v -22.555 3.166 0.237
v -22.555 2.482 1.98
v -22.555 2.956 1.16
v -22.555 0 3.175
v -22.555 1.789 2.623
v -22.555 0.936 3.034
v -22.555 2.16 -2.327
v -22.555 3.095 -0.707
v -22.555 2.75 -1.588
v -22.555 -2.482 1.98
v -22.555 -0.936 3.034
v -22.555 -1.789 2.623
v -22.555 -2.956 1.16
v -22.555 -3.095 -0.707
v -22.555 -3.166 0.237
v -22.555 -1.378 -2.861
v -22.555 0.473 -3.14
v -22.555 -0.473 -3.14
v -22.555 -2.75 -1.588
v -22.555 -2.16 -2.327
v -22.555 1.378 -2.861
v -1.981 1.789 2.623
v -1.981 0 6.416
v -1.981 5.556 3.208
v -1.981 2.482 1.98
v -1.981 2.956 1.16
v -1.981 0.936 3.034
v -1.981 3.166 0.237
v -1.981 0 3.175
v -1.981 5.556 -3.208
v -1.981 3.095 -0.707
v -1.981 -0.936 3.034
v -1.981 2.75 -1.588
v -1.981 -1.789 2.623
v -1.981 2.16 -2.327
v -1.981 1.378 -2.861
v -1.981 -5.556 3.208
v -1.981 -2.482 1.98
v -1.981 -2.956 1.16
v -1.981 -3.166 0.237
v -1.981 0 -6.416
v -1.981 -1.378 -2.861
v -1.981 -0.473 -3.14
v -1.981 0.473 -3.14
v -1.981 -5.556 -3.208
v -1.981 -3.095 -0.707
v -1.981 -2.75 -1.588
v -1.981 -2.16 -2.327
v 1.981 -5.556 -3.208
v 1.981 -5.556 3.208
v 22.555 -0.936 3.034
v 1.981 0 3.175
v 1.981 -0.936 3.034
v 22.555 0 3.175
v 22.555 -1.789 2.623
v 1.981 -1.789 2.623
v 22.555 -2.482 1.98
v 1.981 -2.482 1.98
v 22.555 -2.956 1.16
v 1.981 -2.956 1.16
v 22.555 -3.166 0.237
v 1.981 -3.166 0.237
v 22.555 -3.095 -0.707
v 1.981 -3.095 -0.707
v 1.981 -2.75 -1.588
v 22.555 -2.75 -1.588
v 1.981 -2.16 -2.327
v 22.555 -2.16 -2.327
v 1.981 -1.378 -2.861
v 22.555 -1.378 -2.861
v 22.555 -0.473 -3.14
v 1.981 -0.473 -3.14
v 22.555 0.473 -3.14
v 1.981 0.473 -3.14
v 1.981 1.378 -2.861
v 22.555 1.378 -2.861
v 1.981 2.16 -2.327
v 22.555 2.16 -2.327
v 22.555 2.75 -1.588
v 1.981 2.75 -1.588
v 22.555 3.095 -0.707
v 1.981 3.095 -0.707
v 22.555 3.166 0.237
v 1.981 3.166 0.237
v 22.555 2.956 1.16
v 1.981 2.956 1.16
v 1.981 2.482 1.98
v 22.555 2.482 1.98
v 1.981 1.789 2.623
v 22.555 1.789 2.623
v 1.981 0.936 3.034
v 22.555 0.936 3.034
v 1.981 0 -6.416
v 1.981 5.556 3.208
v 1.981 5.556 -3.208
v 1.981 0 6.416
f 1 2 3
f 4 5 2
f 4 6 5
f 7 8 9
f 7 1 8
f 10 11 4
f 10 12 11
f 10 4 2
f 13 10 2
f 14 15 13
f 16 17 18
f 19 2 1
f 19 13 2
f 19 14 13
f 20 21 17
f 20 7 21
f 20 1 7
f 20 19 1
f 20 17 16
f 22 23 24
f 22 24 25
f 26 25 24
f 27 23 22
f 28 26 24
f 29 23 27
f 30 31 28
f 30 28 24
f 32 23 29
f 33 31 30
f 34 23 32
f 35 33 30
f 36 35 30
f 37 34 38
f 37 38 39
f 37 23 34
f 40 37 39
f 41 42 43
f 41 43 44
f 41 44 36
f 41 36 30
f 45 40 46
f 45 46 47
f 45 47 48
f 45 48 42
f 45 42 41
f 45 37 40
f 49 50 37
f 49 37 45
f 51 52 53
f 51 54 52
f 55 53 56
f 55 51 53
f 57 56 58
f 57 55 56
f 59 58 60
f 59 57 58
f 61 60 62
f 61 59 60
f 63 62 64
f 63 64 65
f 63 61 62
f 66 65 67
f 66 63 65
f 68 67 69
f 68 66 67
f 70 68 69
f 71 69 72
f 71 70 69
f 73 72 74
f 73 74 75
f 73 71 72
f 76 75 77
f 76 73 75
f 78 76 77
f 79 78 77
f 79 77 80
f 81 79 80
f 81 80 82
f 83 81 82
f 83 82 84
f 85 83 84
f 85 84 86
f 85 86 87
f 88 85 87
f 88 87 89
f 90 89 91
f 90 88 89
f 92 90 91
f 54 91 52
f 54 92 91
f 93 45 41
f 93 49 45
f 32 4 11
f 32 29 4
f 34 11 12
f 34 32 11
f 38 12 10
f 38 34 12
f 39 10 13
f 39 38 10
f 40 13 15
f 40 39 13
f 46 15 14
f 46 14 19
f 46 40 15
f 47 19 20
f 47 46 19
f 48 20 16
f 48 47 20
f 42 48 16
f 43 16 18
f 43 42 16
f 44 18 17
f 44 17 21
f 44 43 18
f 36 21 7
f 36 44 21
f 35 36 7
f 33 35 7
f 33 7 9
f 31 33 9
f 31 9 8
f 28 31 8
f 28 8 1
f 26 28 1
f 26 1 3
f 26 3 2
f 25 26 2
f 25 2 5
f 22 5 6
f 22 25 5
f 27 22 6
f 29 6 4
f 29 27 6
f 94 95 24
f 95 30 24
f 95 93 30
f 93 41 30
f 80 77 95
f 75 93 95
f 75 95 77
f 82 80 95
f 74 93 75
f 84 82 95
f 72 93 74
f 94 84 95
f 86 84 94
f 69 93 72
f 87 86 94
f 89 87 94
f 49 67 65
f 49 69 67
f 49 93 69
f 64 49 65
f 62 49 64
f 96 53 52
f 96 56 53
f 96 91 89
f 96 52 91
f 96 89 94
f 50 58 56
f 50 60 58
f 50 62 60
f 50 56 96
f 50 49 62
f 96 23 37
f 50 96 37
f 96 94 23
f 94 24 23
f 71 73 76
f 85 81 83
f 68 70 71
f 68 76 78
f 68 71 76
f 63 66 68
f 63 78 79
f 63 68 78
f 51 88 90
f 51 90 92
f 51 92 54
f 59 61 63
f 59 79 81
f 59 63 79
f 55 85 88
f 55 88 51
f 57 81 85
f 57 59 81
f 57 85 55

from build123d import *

# Parameters (mm, degrees)
BOSS_EXTRUDE1_REACH             = 25.885
BOSS_EXTRUDE1_DIRECTION_2_REACH = 25.885


with BuildPart() as part:
    # Sketch2 → Revolve1 (revolve)
    with BuildSketch(Plane.XY, mode=Mode.PRIVATE) as revolve1_sk:
        Polygon((-22.5552, 0), (-22.5552, 3.175), (-1.9812, 3.175), (-1.9812, 5.55625), (1.9812, 5.55625), (1.9812, 3.175), (22.5552, 3.175), (22.5552, 0), align=None)
    revolve(revolve1_sk.sketch.rotate(Axis((-22.5552, 0, 0), (1, 0, 0)), 90), axis=Axis((-22.5552, 0, 0), (1, 0, 0)))

    # Boss-Extrude1: up to this face of the body (flat: up to its plane)
    boss_extrude1_end = Plane(part.part.faces().sort_by_distance((1.9812, 0, -5.399095518))[0])
    # Sketch3 → Boss-Extrude1 (add, up to the picked face)
    with BuildSketch(Plane(origin=(0, 0, 0), x_dir=(0, 0, -1), z_dir=(1, 0, 0)), mode=Mode.PRIVATE) as boss_extrude1_sk1:
        Polygon((3.207902433, -5.55625), (6.415804866, 0), (3.207902433, 5.55625), (-3.207902433, 5.55625), (-6.415804866, 0), (-3.207902433, -5.55625), align=None)
    boss_extrude1_tool1 = split(extrude(boss_extrude1_sk1.sketch, amount=BOSS_EXTRUDE1_REACH, mode=Mode.PRIVATE), bisect_by=boss_extrude1_end, keep=Keep.BOTH, mode=Mode.PRIVATE)
    add(boss_extrude1_tool1.solids().sort_by(Axis((0, 0, 0), (1, 0, 0)))[0])

    # Boss-Extrude1 direction 2: up to this face of the body (flat: up to its plane)
    boss_extrude1_direction_2_end = Plane(part.part.faces().sort_by_distance((-1.9812, 0, -3.332154482))[0])
    # Sketch3 → Boss-Extrude1 direction 2 (add, up to the picked face)
    with BuildSketch(Plane(origin=(0, 0, 0), x_dir=(0, 0, -1), z_dir=(1, 0, 0)), mode=Mode.PRIVATE) as boss_extrude1_direction_2_sk1:
        Polygon((3.207902433, -5.55625), (6.415804866, 0), (3.207902433, 5.55625), (-3.207902433, 5.55625), (-6.415804866, 0), (-3.207902433, -5.55625), align=None)
    boss_extrude1_direction_2_tool1 = split(extrude(boss_extrude1_direction_2_sk1.sketch, amount=-BOSS_EXTRUDE1_DIRECTION_2_REACH, mode=Mode.PRIVATE), bisect_by=boss_extrude1_direction_2_end, keep=Keep.BOTH, mode=Mode.PRIVATE)
    add(boss_extrude1_direction_2_tool1.solids().sort_by(Axis((0, 0, 0), (-1, 0, 0)))[0])


solid = part.part
